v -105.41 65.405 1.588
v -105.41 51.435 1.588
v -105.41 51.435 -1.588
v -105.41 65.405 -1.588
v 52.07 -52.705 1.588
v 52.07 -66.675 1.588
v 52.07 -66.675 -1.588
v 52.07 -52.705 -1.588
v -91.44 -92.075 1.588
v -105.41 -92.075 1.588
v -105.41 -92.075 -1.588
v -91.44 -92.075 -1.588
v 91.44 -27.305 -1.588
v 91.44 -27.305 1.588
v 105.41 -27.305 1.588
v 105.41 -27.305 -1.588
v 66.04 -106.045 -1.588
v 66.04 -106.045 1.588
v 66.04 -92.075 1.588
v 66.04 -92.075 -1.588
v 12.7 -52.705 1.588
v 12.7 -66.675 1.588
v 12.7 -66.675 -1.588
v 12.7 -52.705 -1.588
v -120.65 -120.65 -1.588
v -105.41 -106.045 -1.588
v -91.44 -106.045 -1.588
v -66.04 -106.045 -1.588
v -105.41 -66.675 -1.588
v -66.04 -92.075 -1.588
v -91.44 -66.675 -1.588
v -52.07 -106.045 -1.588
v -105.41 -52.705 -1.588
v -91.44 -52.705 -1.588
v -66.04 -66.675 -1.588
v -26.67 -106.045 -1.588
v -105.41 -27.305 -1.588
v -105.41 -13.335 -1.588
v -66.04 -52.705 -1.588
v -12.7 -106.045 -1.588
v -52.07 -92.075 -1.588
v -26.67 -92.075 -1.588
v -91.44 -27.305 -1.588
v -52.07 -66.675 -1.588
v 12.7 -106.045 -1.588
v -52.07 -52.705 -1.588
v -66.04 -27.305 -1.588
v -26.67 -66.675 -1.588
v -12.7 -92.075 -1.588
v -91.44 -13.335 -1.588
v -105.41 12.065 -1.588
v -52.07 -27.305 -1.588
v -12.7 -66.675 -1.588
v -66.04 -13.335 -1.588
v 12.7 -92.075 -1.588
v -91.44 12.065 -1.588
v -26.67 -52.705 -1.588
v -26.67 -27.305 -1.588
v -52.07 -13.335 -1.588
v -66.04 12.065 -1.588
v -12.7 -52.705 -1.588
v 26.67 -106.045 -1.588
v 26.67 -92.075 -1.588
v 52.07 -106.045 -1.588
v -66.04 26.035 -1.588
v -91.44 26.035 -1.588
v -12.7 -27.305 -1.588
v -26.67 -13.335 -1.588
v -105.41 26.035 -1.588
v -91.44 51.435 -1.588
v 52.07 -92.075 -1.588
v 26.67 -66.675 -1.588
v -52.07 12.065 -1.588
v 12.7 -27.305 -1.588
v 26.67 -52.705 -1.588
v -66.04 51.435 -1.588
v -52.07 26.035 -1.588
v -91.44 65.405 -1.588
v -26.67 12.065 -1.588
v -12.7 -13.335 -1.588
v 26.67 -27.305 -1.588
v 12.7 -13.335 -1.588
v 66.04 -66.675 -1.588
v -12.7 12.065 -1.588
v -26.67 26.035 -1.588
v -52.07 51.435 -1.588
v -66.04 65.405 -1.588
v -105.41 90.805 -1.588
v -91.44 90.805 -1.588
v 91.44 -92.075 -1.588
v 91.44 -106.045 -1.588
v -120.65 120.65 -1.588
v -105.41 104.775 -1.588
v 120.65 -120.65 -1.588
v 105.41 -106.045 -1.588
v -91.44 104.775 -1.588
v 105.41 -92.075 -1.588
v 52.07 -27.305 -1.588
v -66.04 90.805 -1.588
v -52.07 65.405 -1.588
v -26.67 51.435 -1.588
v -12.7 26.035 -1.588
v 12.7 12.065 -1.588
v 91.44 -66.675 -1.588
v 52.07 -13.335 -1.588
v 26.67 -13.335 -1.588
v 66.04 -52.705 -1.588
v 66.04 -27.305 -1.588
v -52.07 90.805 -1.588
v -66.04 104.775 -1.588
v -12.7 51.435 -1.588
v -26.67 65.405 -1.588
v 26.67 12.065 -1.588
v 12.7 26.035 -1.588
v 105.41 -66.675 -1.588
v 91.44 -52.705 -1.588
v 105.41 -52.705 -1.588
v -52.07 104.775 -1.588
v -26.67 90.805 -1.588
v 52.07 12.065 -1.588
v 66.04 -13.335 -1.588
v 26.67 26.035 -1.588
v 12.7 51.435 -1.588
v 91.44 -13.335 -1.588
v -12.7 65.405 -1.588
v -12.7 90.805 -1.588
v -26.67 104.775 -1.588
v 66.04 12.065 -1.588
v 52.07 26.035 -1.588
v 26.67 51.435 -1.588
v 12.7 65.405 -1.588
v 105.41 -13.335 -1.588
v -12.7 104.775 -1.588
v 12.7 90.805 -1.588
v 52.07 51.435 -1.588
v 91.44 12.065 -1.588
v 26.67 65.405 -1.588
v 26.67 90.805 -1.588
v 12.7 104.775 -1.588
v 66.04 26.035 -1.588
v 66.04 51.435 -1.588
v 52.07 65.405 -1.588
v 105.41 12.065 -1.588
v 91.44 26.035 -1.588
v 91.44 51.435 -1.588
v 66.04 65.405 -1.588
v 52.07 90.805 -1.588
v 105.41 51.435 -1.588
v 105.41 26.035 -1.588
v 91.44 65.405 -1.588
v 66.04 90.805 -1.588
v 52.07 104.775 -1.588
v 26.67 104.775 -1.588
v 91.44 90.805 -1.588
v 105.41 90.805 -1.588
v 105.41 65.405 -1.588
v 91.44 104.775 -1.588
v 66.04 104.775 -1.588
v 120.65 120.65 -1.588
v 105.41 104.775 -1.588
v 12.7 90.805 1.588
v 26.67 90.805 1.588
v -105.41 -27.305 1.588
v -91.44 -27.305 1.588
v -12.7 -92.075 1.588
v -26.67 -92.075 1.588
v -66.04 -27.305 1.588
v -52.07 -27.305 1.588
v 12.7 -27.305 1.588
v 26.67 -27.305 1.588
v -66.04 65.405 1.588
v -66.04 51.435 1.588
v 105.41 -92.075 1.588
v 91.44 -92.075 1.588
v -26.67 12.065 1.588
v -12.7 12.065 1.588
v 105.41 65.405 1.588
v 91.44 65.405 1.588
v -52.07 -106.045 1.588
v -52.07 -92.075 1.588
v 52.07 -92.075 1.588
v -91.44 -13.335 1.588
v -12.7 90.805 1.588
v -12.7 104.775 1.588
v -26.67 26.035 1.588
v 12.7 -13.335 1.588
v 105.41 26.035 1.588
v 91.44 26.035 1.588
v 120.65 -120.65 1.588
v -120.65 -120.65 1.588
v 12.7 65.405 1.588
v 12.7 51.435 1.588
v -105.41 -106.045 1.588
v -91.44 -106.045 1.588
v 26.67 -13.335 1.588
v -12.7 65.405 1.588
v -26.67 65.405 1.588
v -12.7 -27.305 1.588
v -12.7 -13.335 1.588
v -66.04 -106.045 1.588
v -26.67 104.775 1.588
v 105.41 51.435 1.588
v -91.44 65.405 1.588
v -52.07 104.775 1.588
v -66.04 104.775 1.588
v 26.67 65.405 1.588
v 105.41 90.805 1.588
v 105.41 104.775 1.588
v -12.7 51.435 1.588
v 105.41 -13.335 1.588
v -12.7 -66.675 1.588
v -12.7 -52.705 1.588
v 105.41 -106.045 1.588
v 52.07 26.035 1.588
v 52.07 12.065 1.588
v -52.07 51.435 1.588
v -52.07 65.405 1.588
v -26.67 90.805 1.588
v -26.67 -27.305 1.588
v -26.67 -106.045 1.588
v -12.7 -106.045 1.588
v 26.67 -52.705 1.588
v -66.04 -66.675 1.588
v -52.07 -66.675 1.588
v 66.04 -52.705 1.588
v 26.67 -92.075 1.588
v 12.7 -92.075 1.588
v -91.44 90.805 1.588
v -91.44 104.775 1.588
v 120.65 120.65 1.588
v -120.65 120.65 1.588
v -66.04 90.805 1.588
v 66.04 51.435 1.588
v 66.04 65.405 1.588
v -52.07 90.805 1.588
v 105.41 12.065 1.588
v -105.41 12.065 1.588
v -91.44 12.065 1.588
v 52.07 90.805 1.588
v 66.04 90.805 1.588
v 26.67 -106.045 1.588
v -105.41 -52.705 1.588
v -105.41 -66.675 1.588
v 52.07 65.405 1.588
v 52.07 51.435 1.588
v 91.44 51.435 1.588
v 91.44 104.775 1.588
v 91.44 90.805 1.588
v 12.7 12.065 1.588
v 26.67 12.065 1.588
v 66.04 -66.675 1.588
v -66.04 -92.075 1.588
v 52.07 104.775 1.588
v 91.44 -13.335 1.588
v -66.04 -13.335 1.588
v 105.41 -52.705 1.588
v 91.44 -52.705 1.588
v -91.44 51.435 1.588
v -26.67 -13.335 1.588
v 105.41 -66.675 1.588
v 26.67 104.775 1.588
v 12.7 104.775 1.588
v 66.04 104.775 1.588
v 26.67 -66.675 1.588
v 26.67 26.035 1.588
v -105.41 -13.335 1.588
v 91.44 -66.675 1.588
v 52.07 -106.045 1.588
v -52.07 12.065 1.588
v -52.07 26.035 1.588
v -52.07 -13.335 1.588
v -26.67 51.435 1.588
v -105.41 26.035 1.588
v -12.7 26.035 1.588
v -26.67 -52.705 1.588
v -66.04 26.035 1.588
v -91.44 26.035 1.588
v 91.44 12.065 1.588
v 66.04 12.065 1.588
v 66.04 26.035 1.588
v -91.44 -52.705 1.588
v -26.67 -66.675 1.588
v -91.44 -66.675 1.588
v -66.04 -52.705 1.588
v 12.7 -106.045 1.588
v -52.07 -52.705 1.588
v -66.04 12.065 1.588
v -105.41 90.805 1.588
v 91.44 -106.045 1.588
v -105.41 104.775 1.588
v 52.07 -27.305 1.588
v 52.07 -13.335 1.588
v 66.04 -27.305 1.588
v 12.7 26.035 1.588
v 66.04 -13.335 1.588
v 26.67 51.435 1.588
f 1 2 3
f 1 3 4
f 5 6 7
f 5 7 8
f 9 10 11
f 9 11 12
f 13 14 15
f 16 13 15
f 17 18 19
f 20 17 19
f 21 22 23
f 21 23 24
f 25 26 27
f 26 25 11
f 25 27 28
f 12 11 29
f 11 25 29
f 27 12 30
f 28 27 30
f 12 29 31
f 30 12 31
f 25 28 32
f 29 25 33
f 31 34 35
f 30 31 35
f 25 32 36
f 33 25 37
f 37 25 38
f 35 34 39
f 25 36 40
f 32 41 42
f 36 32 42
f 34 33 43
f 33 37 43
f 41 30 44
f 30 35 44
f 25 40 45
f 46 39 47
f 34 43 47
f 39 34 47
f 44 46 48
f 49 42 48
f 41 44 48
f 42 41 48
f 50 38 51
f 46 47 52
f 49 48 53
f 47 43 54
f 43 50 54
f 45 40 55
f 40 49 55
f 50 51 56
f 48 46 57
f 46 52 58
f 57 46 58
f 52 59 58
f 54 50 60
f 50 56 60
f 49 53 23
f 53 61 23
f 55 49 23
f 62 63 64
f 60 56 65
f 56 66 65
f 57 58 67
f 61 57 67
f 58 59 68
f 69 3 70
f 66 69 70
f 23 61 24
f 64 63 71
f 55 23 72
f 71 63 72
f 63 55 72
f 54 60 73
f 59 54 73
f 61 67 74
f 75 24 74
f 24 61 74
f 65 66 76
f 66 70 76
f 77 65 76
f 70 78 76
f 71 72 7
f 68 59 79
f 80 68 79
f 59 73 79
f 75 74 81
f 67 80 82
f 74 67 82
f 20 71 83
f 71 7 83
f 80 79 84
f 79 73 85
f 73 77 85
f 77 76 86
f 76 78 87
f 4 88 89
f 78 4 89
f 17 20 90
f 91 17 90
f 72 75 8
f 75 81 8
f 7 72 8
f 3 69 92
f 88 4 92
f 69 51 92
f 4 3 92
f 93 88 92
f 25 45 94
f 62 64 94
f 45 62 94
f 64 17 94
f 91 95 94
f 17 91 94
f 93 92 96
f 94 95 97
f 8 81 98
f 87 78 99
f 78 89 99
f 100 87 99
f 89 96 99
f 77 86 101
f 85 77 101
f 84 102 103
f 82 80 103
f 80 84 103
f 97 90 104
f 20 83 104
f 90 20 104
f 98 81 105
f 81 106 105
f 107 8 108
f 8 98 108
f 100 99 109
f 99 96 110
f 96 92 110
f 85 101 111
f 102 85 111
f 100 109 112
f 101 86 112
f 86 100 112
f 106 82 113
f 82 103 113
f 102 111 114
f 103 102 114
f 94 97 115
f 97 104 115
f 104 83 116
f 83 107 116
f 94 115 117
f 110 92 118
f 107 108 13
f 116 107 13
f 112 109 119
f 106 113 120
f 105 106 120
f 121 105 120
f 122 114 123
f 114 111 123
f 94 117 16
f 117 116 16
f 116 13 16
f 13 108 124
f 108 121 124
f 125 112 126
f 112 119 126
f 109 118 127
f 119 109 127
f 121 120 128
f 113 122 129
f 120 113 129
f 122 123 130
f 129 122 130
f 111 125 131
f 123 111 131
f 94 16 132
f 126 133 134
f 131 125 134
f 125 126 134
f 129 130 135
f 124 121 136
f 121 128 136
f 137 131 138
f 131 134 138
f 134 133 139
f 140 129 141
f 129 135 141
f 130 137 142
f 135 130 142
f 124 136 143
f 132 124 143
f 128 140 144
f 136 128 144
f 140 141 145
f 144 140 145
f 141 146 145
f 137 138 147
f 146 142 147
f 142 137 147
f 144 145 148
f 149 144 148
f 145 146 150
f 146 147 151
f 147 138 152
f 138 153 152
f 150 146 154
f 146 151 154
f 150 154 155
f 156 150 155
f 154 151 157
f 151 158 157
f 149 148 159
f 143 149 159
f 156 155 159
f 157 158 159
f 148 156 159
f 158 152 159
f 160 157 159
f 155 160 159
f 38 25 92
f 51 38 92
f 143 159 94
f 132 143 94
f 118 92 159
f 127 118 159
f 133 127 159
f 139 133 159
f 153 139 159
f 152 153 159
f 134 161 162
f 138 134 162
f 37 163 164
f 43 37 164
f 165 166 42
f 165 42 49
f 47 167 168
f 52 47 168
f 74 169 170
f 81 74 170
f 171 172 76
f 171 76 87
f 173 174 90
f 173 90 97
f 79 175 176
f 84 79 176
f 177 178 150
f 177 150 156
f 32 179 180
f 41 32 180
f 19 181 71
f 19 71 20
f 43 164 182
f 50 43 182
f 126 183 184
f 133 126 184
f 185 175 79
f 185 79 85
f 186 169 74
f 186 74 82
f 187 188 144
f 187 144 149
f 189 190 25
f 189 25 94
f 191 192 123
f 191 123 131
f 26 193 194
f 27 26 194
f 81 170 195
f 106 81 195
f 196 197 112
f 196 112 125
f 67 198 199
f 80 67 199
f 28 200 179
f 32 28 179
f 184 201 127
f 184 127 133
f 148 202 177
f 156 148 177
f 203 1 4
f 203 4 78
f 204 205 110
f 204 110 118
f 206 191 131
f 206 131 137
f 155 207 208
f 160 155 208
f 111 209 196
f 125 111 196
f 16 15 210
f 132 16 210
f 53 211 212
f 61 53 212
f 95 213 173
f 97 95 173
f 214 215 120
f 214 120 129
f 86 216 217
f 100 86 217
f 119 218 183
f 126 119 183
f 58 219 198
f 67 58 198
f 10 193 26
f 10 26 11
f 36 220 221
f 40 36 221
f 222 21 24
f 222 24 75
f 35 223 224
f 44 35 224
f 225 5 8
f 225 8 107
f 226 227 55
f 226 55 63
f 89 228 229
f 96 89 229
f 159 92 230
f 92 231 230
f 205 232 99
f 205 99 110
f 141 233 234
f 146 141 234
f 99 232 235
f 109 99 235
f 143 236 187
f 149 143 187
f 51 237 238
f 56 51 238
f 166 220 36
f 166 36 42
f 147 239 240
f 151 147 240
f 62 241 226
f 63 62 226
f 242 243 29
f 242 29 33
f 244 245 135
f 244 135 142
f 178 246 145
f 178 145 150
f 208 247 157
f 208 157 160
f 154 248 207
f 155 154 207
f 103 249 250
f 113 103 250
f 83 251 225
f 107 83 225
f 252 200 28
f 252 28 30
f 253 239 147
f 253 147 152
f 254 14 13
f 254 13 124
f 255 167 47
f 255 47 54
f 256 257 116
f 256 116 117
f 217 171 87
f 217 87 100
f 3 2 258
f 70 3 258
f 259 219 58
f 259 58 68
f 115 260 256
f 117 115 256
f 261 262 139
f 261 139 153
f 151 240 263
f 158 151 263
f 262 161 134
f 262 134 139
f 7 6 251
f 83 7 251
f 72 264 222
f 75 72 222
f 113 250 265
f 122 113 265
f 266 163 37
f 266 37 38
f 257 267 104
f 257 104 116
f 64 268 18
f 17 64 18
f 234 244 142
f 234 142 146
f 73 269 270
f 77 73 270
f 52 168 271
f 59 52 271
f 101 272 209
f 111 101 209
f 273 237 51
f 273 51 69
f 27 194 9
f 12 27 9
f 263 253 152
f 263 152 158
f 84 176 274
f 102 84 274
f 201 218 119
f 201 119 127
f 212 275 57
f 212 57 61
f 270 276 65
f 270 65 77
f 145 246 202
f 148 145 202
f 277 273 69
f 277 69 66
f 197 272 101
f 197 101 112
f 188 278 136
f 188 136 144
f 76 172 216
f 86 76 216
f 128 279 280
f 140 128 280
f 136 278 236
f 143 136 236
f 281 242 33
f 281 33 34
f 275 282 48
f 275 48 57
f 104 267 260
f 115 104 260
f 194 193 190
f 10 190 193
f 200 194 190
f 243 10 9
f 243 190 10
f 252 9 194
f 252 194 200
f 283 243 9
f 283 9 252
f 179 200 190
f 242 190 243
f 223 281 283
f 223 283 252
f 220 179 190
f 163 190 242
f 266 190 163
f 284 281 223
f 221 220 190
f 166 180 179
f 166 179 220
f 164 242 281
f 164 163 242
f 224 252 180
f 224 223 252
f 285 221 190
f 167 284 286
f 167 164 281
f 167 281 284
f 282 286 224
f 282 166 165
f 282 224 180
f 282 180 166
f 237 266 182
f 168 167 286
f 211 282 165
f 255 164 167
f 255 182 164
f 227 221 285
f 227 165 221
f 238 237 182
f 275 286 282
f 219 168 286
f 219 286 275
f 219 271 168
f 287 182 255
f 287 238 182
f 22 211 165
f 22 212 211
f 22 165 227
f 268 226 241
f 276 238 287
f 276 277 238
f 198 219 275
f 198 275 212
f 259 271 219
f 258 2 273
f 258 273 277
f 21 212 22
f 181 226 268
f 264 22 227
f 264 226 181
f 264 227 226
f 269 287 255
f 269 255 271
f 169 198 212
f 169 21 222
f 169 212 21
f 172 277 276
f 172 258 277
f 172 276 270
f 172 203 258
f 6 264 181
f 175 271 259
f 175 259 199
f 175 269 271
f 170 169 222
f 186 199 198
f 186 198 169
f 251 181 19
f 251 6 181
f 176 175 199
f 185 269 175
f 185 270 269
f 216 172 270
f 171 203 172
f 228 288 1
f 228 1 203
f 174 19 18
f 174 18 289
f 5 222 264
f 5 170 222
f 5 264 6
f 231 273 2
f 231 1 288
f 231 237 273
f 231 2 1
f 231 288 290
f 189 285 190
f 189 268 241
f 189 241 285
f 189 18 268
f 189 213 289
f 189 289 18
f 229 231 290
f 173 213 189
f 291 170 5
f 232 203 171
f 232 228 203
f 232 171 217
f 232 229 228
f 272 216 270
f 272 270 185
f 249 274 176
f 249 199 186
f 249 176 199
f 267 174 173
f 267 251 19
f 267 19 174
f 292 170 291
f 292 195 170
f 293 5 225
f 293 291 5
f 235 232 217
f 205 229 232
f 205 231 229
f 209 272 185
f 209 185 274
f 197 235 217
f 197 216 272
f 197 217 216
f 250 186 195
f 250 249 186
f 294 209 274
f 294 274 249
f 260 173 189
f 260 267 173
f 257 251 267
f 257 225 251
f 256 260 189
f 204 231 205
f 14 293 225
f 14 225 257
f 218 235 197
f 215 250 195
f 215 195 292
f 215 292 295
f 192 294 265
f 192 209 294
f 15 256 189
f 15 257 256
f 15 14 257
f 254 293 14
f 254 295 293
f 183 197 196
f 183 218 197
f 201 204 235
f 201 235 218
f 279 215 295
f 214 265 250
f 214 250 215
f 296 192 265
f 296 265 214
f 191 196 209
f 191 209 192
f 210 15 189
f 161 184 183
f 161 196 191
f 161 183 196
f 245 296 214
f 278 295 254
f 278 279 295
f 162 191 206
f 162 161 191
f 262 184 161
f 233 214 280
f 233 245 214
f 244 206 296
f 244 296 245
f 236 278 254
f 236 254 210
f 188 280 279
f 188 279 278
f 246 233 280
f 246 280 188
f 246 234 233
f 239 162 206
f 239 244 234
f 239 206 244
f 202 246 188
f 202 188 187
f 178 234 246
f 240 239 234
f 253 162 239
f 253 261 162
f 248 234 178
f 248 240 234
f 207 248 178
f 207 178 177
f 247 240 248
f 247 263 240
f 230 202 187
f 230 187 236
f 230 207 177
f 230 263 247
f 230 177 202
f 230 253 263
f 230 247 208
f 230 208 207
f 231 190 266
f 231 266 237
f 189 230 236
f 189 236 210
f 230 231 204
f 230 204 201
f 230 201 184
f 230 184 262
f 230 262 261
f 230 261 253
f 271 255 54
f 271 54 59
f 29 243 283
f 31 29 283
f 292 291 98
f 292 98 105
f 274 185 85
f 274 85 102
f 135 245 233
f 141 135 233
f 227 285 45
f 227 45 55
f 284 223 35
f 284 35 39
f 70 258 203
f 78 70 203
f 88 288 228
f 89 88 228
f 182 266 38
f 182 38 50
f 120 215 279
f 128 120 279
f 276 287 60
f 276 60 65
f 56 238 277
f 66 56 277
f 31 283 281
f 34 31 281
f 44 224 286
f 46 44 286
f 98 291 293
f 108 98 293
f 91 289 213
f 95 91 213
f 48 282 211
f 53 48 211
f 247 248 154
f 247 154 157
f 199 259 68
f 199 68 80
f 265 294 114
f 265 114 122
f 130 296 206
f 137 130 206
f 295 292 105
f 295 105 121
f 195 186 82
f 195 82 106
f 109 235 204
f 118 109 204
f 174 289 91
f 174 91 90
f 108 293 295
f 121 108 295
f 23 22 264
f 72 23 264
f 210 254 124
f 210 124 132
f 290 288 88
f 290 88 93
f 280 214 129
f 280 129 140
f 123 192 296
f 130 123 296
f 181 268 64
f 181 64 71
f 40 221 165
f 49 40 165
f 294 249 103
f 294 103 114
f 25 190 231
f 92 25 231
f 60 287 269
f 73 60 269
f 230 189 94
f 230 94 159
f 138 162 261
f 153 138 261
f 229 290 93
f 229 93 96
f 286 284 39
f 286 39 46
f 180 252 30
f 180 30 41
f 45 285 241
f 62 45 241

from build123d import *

# Parameters (mm, degrees)
F0_W     = 241.3
F0_H     = 241.3
F1_DEPTH = 1.5875
F2_W     = 13.97
F2_H     = 13.97
F3_DEPTH = 3.175


with BuildPart() as f1:
    # F0 (on Top) → F1 (new body, symmetric)
    with BuildSketch(Plane.XY):
        Rectangle(F0_W, F0_H)
    extrude(amount=F1_DEPTH, both=True)

    # F2 (on face) → F3 (cut, through all)
    with BuildSketch(Plane.XY.offset(1.5875)):
        with Locations((-98.425, 97.79)):
            Rectangle(F2_W, F2_H)
        with Locations((-98.425, 58.42)):
            Rectangle(F2_W, F2_H)
        with Locations((-98.425, 19.05)):
            Rectangle(F2_W, F2_H)
        with Locations((-98.425, -20.32)):
            Rectangle(F2_W, F2_H)
        with Locations((-98.425, -59.69)):
            Rectangle(F2_W, F2_H)
        with Locations((-98.425, -99.06)):
            Rectangle(F2_W, F2_H)
        with Locations((-59.055, 97.79)):
            Rectangle(F2_W, F2_H)
        with Locations((-59.055, 58.42)):
            Rectangle(F2_W, F2_H)
        with Locations((-59.055, 19.05)):
            Rectangle(F2_W, F2_H)
        with Locations((-59.055, -20.32)):
            Rectangle(F2_W, F2_H)
        with Locations((-59.055, -59.69)):
            Rectangle(F2_W, F2_H)
        with Locations((-59.055, -99.06)):
            Rectangle(F2_W, F2_H)
        with Locations((-19.685, 97.79)):
            Rectangle(F2_W, F2_H)
        with Locations((-19.685, 58.42)):
            Rectangle(F2_W, F2_H)
        with Locations((-19.685, 19.05)):
            Rectangle(F2_W, F2_H)
        with Locations((-19.685, -20.32)):
            Rectangle(F2_W, F2_H)
        with Locations((-19.685, -59.69)):
            Rectangle(F2_W, F2_H)
        with Locations((-19.685, -99.06)):
            Rectangle(F2_W, F2_H)
        with Locations((19.685, 97.79)):
            Rectangle(F2_W, F2_H)
        with Locations((19.685, 58.42)):
            Rectangle(F2_W, F2_H)
        with Locations((19.685, 19.05)):
            Rectangle(F2_W, F2_H)
        with Locations((19.685, -20.32)):
            Rectangle(F2_W, F2_H)
        with Locations((19.685, -59.69)):
            Rectangle(F2_W, F2_H)
        with Locations((19.685, -99.06)):
            Rectangle(F2_W, F2_H)
        with Locations((59.055, 97.79)):
            Rectangle(F2_W, F2_H)
        with Locations((59.055, 58.42)):
            Rectangle(F2_W, F2_H)
        with Locations((59.055, 19.05)):
            Rectangle(F2_W, F2_H)
        with Locations((59.055, -20.32)):
            Rectangle(F2_W, F2_H)
        with Locations((59.055, -59.69)):
            Rectangle(F2_W, F2_H)
        with Locations((59.055, -99.06)):
            Rectangle(F2_W, F2_H)
        with Locations((98.425, 97.79)):
            Rectangle(F2_W, F2_H)
        with Locations((98.425, 58.42)):
            Rectangle(F2_W, F2_H)
        with Locations((98.425, 19.05)):
            Rectangle(F2_W, F2_H)
        with Locations((98.425, -20.32)):
            Rectangle(F2_W, F2_H)
        with Locations((98.425, -59.69)):
            Rectangle(F2_W, F2_H)
        with Locations((98.425, -99.06)):
            Rectangle(F2_W, F2_H)
    extrude(amount=-F3_DEPTH, mode=Mode.SUBTRACT)


solid = f1.part
